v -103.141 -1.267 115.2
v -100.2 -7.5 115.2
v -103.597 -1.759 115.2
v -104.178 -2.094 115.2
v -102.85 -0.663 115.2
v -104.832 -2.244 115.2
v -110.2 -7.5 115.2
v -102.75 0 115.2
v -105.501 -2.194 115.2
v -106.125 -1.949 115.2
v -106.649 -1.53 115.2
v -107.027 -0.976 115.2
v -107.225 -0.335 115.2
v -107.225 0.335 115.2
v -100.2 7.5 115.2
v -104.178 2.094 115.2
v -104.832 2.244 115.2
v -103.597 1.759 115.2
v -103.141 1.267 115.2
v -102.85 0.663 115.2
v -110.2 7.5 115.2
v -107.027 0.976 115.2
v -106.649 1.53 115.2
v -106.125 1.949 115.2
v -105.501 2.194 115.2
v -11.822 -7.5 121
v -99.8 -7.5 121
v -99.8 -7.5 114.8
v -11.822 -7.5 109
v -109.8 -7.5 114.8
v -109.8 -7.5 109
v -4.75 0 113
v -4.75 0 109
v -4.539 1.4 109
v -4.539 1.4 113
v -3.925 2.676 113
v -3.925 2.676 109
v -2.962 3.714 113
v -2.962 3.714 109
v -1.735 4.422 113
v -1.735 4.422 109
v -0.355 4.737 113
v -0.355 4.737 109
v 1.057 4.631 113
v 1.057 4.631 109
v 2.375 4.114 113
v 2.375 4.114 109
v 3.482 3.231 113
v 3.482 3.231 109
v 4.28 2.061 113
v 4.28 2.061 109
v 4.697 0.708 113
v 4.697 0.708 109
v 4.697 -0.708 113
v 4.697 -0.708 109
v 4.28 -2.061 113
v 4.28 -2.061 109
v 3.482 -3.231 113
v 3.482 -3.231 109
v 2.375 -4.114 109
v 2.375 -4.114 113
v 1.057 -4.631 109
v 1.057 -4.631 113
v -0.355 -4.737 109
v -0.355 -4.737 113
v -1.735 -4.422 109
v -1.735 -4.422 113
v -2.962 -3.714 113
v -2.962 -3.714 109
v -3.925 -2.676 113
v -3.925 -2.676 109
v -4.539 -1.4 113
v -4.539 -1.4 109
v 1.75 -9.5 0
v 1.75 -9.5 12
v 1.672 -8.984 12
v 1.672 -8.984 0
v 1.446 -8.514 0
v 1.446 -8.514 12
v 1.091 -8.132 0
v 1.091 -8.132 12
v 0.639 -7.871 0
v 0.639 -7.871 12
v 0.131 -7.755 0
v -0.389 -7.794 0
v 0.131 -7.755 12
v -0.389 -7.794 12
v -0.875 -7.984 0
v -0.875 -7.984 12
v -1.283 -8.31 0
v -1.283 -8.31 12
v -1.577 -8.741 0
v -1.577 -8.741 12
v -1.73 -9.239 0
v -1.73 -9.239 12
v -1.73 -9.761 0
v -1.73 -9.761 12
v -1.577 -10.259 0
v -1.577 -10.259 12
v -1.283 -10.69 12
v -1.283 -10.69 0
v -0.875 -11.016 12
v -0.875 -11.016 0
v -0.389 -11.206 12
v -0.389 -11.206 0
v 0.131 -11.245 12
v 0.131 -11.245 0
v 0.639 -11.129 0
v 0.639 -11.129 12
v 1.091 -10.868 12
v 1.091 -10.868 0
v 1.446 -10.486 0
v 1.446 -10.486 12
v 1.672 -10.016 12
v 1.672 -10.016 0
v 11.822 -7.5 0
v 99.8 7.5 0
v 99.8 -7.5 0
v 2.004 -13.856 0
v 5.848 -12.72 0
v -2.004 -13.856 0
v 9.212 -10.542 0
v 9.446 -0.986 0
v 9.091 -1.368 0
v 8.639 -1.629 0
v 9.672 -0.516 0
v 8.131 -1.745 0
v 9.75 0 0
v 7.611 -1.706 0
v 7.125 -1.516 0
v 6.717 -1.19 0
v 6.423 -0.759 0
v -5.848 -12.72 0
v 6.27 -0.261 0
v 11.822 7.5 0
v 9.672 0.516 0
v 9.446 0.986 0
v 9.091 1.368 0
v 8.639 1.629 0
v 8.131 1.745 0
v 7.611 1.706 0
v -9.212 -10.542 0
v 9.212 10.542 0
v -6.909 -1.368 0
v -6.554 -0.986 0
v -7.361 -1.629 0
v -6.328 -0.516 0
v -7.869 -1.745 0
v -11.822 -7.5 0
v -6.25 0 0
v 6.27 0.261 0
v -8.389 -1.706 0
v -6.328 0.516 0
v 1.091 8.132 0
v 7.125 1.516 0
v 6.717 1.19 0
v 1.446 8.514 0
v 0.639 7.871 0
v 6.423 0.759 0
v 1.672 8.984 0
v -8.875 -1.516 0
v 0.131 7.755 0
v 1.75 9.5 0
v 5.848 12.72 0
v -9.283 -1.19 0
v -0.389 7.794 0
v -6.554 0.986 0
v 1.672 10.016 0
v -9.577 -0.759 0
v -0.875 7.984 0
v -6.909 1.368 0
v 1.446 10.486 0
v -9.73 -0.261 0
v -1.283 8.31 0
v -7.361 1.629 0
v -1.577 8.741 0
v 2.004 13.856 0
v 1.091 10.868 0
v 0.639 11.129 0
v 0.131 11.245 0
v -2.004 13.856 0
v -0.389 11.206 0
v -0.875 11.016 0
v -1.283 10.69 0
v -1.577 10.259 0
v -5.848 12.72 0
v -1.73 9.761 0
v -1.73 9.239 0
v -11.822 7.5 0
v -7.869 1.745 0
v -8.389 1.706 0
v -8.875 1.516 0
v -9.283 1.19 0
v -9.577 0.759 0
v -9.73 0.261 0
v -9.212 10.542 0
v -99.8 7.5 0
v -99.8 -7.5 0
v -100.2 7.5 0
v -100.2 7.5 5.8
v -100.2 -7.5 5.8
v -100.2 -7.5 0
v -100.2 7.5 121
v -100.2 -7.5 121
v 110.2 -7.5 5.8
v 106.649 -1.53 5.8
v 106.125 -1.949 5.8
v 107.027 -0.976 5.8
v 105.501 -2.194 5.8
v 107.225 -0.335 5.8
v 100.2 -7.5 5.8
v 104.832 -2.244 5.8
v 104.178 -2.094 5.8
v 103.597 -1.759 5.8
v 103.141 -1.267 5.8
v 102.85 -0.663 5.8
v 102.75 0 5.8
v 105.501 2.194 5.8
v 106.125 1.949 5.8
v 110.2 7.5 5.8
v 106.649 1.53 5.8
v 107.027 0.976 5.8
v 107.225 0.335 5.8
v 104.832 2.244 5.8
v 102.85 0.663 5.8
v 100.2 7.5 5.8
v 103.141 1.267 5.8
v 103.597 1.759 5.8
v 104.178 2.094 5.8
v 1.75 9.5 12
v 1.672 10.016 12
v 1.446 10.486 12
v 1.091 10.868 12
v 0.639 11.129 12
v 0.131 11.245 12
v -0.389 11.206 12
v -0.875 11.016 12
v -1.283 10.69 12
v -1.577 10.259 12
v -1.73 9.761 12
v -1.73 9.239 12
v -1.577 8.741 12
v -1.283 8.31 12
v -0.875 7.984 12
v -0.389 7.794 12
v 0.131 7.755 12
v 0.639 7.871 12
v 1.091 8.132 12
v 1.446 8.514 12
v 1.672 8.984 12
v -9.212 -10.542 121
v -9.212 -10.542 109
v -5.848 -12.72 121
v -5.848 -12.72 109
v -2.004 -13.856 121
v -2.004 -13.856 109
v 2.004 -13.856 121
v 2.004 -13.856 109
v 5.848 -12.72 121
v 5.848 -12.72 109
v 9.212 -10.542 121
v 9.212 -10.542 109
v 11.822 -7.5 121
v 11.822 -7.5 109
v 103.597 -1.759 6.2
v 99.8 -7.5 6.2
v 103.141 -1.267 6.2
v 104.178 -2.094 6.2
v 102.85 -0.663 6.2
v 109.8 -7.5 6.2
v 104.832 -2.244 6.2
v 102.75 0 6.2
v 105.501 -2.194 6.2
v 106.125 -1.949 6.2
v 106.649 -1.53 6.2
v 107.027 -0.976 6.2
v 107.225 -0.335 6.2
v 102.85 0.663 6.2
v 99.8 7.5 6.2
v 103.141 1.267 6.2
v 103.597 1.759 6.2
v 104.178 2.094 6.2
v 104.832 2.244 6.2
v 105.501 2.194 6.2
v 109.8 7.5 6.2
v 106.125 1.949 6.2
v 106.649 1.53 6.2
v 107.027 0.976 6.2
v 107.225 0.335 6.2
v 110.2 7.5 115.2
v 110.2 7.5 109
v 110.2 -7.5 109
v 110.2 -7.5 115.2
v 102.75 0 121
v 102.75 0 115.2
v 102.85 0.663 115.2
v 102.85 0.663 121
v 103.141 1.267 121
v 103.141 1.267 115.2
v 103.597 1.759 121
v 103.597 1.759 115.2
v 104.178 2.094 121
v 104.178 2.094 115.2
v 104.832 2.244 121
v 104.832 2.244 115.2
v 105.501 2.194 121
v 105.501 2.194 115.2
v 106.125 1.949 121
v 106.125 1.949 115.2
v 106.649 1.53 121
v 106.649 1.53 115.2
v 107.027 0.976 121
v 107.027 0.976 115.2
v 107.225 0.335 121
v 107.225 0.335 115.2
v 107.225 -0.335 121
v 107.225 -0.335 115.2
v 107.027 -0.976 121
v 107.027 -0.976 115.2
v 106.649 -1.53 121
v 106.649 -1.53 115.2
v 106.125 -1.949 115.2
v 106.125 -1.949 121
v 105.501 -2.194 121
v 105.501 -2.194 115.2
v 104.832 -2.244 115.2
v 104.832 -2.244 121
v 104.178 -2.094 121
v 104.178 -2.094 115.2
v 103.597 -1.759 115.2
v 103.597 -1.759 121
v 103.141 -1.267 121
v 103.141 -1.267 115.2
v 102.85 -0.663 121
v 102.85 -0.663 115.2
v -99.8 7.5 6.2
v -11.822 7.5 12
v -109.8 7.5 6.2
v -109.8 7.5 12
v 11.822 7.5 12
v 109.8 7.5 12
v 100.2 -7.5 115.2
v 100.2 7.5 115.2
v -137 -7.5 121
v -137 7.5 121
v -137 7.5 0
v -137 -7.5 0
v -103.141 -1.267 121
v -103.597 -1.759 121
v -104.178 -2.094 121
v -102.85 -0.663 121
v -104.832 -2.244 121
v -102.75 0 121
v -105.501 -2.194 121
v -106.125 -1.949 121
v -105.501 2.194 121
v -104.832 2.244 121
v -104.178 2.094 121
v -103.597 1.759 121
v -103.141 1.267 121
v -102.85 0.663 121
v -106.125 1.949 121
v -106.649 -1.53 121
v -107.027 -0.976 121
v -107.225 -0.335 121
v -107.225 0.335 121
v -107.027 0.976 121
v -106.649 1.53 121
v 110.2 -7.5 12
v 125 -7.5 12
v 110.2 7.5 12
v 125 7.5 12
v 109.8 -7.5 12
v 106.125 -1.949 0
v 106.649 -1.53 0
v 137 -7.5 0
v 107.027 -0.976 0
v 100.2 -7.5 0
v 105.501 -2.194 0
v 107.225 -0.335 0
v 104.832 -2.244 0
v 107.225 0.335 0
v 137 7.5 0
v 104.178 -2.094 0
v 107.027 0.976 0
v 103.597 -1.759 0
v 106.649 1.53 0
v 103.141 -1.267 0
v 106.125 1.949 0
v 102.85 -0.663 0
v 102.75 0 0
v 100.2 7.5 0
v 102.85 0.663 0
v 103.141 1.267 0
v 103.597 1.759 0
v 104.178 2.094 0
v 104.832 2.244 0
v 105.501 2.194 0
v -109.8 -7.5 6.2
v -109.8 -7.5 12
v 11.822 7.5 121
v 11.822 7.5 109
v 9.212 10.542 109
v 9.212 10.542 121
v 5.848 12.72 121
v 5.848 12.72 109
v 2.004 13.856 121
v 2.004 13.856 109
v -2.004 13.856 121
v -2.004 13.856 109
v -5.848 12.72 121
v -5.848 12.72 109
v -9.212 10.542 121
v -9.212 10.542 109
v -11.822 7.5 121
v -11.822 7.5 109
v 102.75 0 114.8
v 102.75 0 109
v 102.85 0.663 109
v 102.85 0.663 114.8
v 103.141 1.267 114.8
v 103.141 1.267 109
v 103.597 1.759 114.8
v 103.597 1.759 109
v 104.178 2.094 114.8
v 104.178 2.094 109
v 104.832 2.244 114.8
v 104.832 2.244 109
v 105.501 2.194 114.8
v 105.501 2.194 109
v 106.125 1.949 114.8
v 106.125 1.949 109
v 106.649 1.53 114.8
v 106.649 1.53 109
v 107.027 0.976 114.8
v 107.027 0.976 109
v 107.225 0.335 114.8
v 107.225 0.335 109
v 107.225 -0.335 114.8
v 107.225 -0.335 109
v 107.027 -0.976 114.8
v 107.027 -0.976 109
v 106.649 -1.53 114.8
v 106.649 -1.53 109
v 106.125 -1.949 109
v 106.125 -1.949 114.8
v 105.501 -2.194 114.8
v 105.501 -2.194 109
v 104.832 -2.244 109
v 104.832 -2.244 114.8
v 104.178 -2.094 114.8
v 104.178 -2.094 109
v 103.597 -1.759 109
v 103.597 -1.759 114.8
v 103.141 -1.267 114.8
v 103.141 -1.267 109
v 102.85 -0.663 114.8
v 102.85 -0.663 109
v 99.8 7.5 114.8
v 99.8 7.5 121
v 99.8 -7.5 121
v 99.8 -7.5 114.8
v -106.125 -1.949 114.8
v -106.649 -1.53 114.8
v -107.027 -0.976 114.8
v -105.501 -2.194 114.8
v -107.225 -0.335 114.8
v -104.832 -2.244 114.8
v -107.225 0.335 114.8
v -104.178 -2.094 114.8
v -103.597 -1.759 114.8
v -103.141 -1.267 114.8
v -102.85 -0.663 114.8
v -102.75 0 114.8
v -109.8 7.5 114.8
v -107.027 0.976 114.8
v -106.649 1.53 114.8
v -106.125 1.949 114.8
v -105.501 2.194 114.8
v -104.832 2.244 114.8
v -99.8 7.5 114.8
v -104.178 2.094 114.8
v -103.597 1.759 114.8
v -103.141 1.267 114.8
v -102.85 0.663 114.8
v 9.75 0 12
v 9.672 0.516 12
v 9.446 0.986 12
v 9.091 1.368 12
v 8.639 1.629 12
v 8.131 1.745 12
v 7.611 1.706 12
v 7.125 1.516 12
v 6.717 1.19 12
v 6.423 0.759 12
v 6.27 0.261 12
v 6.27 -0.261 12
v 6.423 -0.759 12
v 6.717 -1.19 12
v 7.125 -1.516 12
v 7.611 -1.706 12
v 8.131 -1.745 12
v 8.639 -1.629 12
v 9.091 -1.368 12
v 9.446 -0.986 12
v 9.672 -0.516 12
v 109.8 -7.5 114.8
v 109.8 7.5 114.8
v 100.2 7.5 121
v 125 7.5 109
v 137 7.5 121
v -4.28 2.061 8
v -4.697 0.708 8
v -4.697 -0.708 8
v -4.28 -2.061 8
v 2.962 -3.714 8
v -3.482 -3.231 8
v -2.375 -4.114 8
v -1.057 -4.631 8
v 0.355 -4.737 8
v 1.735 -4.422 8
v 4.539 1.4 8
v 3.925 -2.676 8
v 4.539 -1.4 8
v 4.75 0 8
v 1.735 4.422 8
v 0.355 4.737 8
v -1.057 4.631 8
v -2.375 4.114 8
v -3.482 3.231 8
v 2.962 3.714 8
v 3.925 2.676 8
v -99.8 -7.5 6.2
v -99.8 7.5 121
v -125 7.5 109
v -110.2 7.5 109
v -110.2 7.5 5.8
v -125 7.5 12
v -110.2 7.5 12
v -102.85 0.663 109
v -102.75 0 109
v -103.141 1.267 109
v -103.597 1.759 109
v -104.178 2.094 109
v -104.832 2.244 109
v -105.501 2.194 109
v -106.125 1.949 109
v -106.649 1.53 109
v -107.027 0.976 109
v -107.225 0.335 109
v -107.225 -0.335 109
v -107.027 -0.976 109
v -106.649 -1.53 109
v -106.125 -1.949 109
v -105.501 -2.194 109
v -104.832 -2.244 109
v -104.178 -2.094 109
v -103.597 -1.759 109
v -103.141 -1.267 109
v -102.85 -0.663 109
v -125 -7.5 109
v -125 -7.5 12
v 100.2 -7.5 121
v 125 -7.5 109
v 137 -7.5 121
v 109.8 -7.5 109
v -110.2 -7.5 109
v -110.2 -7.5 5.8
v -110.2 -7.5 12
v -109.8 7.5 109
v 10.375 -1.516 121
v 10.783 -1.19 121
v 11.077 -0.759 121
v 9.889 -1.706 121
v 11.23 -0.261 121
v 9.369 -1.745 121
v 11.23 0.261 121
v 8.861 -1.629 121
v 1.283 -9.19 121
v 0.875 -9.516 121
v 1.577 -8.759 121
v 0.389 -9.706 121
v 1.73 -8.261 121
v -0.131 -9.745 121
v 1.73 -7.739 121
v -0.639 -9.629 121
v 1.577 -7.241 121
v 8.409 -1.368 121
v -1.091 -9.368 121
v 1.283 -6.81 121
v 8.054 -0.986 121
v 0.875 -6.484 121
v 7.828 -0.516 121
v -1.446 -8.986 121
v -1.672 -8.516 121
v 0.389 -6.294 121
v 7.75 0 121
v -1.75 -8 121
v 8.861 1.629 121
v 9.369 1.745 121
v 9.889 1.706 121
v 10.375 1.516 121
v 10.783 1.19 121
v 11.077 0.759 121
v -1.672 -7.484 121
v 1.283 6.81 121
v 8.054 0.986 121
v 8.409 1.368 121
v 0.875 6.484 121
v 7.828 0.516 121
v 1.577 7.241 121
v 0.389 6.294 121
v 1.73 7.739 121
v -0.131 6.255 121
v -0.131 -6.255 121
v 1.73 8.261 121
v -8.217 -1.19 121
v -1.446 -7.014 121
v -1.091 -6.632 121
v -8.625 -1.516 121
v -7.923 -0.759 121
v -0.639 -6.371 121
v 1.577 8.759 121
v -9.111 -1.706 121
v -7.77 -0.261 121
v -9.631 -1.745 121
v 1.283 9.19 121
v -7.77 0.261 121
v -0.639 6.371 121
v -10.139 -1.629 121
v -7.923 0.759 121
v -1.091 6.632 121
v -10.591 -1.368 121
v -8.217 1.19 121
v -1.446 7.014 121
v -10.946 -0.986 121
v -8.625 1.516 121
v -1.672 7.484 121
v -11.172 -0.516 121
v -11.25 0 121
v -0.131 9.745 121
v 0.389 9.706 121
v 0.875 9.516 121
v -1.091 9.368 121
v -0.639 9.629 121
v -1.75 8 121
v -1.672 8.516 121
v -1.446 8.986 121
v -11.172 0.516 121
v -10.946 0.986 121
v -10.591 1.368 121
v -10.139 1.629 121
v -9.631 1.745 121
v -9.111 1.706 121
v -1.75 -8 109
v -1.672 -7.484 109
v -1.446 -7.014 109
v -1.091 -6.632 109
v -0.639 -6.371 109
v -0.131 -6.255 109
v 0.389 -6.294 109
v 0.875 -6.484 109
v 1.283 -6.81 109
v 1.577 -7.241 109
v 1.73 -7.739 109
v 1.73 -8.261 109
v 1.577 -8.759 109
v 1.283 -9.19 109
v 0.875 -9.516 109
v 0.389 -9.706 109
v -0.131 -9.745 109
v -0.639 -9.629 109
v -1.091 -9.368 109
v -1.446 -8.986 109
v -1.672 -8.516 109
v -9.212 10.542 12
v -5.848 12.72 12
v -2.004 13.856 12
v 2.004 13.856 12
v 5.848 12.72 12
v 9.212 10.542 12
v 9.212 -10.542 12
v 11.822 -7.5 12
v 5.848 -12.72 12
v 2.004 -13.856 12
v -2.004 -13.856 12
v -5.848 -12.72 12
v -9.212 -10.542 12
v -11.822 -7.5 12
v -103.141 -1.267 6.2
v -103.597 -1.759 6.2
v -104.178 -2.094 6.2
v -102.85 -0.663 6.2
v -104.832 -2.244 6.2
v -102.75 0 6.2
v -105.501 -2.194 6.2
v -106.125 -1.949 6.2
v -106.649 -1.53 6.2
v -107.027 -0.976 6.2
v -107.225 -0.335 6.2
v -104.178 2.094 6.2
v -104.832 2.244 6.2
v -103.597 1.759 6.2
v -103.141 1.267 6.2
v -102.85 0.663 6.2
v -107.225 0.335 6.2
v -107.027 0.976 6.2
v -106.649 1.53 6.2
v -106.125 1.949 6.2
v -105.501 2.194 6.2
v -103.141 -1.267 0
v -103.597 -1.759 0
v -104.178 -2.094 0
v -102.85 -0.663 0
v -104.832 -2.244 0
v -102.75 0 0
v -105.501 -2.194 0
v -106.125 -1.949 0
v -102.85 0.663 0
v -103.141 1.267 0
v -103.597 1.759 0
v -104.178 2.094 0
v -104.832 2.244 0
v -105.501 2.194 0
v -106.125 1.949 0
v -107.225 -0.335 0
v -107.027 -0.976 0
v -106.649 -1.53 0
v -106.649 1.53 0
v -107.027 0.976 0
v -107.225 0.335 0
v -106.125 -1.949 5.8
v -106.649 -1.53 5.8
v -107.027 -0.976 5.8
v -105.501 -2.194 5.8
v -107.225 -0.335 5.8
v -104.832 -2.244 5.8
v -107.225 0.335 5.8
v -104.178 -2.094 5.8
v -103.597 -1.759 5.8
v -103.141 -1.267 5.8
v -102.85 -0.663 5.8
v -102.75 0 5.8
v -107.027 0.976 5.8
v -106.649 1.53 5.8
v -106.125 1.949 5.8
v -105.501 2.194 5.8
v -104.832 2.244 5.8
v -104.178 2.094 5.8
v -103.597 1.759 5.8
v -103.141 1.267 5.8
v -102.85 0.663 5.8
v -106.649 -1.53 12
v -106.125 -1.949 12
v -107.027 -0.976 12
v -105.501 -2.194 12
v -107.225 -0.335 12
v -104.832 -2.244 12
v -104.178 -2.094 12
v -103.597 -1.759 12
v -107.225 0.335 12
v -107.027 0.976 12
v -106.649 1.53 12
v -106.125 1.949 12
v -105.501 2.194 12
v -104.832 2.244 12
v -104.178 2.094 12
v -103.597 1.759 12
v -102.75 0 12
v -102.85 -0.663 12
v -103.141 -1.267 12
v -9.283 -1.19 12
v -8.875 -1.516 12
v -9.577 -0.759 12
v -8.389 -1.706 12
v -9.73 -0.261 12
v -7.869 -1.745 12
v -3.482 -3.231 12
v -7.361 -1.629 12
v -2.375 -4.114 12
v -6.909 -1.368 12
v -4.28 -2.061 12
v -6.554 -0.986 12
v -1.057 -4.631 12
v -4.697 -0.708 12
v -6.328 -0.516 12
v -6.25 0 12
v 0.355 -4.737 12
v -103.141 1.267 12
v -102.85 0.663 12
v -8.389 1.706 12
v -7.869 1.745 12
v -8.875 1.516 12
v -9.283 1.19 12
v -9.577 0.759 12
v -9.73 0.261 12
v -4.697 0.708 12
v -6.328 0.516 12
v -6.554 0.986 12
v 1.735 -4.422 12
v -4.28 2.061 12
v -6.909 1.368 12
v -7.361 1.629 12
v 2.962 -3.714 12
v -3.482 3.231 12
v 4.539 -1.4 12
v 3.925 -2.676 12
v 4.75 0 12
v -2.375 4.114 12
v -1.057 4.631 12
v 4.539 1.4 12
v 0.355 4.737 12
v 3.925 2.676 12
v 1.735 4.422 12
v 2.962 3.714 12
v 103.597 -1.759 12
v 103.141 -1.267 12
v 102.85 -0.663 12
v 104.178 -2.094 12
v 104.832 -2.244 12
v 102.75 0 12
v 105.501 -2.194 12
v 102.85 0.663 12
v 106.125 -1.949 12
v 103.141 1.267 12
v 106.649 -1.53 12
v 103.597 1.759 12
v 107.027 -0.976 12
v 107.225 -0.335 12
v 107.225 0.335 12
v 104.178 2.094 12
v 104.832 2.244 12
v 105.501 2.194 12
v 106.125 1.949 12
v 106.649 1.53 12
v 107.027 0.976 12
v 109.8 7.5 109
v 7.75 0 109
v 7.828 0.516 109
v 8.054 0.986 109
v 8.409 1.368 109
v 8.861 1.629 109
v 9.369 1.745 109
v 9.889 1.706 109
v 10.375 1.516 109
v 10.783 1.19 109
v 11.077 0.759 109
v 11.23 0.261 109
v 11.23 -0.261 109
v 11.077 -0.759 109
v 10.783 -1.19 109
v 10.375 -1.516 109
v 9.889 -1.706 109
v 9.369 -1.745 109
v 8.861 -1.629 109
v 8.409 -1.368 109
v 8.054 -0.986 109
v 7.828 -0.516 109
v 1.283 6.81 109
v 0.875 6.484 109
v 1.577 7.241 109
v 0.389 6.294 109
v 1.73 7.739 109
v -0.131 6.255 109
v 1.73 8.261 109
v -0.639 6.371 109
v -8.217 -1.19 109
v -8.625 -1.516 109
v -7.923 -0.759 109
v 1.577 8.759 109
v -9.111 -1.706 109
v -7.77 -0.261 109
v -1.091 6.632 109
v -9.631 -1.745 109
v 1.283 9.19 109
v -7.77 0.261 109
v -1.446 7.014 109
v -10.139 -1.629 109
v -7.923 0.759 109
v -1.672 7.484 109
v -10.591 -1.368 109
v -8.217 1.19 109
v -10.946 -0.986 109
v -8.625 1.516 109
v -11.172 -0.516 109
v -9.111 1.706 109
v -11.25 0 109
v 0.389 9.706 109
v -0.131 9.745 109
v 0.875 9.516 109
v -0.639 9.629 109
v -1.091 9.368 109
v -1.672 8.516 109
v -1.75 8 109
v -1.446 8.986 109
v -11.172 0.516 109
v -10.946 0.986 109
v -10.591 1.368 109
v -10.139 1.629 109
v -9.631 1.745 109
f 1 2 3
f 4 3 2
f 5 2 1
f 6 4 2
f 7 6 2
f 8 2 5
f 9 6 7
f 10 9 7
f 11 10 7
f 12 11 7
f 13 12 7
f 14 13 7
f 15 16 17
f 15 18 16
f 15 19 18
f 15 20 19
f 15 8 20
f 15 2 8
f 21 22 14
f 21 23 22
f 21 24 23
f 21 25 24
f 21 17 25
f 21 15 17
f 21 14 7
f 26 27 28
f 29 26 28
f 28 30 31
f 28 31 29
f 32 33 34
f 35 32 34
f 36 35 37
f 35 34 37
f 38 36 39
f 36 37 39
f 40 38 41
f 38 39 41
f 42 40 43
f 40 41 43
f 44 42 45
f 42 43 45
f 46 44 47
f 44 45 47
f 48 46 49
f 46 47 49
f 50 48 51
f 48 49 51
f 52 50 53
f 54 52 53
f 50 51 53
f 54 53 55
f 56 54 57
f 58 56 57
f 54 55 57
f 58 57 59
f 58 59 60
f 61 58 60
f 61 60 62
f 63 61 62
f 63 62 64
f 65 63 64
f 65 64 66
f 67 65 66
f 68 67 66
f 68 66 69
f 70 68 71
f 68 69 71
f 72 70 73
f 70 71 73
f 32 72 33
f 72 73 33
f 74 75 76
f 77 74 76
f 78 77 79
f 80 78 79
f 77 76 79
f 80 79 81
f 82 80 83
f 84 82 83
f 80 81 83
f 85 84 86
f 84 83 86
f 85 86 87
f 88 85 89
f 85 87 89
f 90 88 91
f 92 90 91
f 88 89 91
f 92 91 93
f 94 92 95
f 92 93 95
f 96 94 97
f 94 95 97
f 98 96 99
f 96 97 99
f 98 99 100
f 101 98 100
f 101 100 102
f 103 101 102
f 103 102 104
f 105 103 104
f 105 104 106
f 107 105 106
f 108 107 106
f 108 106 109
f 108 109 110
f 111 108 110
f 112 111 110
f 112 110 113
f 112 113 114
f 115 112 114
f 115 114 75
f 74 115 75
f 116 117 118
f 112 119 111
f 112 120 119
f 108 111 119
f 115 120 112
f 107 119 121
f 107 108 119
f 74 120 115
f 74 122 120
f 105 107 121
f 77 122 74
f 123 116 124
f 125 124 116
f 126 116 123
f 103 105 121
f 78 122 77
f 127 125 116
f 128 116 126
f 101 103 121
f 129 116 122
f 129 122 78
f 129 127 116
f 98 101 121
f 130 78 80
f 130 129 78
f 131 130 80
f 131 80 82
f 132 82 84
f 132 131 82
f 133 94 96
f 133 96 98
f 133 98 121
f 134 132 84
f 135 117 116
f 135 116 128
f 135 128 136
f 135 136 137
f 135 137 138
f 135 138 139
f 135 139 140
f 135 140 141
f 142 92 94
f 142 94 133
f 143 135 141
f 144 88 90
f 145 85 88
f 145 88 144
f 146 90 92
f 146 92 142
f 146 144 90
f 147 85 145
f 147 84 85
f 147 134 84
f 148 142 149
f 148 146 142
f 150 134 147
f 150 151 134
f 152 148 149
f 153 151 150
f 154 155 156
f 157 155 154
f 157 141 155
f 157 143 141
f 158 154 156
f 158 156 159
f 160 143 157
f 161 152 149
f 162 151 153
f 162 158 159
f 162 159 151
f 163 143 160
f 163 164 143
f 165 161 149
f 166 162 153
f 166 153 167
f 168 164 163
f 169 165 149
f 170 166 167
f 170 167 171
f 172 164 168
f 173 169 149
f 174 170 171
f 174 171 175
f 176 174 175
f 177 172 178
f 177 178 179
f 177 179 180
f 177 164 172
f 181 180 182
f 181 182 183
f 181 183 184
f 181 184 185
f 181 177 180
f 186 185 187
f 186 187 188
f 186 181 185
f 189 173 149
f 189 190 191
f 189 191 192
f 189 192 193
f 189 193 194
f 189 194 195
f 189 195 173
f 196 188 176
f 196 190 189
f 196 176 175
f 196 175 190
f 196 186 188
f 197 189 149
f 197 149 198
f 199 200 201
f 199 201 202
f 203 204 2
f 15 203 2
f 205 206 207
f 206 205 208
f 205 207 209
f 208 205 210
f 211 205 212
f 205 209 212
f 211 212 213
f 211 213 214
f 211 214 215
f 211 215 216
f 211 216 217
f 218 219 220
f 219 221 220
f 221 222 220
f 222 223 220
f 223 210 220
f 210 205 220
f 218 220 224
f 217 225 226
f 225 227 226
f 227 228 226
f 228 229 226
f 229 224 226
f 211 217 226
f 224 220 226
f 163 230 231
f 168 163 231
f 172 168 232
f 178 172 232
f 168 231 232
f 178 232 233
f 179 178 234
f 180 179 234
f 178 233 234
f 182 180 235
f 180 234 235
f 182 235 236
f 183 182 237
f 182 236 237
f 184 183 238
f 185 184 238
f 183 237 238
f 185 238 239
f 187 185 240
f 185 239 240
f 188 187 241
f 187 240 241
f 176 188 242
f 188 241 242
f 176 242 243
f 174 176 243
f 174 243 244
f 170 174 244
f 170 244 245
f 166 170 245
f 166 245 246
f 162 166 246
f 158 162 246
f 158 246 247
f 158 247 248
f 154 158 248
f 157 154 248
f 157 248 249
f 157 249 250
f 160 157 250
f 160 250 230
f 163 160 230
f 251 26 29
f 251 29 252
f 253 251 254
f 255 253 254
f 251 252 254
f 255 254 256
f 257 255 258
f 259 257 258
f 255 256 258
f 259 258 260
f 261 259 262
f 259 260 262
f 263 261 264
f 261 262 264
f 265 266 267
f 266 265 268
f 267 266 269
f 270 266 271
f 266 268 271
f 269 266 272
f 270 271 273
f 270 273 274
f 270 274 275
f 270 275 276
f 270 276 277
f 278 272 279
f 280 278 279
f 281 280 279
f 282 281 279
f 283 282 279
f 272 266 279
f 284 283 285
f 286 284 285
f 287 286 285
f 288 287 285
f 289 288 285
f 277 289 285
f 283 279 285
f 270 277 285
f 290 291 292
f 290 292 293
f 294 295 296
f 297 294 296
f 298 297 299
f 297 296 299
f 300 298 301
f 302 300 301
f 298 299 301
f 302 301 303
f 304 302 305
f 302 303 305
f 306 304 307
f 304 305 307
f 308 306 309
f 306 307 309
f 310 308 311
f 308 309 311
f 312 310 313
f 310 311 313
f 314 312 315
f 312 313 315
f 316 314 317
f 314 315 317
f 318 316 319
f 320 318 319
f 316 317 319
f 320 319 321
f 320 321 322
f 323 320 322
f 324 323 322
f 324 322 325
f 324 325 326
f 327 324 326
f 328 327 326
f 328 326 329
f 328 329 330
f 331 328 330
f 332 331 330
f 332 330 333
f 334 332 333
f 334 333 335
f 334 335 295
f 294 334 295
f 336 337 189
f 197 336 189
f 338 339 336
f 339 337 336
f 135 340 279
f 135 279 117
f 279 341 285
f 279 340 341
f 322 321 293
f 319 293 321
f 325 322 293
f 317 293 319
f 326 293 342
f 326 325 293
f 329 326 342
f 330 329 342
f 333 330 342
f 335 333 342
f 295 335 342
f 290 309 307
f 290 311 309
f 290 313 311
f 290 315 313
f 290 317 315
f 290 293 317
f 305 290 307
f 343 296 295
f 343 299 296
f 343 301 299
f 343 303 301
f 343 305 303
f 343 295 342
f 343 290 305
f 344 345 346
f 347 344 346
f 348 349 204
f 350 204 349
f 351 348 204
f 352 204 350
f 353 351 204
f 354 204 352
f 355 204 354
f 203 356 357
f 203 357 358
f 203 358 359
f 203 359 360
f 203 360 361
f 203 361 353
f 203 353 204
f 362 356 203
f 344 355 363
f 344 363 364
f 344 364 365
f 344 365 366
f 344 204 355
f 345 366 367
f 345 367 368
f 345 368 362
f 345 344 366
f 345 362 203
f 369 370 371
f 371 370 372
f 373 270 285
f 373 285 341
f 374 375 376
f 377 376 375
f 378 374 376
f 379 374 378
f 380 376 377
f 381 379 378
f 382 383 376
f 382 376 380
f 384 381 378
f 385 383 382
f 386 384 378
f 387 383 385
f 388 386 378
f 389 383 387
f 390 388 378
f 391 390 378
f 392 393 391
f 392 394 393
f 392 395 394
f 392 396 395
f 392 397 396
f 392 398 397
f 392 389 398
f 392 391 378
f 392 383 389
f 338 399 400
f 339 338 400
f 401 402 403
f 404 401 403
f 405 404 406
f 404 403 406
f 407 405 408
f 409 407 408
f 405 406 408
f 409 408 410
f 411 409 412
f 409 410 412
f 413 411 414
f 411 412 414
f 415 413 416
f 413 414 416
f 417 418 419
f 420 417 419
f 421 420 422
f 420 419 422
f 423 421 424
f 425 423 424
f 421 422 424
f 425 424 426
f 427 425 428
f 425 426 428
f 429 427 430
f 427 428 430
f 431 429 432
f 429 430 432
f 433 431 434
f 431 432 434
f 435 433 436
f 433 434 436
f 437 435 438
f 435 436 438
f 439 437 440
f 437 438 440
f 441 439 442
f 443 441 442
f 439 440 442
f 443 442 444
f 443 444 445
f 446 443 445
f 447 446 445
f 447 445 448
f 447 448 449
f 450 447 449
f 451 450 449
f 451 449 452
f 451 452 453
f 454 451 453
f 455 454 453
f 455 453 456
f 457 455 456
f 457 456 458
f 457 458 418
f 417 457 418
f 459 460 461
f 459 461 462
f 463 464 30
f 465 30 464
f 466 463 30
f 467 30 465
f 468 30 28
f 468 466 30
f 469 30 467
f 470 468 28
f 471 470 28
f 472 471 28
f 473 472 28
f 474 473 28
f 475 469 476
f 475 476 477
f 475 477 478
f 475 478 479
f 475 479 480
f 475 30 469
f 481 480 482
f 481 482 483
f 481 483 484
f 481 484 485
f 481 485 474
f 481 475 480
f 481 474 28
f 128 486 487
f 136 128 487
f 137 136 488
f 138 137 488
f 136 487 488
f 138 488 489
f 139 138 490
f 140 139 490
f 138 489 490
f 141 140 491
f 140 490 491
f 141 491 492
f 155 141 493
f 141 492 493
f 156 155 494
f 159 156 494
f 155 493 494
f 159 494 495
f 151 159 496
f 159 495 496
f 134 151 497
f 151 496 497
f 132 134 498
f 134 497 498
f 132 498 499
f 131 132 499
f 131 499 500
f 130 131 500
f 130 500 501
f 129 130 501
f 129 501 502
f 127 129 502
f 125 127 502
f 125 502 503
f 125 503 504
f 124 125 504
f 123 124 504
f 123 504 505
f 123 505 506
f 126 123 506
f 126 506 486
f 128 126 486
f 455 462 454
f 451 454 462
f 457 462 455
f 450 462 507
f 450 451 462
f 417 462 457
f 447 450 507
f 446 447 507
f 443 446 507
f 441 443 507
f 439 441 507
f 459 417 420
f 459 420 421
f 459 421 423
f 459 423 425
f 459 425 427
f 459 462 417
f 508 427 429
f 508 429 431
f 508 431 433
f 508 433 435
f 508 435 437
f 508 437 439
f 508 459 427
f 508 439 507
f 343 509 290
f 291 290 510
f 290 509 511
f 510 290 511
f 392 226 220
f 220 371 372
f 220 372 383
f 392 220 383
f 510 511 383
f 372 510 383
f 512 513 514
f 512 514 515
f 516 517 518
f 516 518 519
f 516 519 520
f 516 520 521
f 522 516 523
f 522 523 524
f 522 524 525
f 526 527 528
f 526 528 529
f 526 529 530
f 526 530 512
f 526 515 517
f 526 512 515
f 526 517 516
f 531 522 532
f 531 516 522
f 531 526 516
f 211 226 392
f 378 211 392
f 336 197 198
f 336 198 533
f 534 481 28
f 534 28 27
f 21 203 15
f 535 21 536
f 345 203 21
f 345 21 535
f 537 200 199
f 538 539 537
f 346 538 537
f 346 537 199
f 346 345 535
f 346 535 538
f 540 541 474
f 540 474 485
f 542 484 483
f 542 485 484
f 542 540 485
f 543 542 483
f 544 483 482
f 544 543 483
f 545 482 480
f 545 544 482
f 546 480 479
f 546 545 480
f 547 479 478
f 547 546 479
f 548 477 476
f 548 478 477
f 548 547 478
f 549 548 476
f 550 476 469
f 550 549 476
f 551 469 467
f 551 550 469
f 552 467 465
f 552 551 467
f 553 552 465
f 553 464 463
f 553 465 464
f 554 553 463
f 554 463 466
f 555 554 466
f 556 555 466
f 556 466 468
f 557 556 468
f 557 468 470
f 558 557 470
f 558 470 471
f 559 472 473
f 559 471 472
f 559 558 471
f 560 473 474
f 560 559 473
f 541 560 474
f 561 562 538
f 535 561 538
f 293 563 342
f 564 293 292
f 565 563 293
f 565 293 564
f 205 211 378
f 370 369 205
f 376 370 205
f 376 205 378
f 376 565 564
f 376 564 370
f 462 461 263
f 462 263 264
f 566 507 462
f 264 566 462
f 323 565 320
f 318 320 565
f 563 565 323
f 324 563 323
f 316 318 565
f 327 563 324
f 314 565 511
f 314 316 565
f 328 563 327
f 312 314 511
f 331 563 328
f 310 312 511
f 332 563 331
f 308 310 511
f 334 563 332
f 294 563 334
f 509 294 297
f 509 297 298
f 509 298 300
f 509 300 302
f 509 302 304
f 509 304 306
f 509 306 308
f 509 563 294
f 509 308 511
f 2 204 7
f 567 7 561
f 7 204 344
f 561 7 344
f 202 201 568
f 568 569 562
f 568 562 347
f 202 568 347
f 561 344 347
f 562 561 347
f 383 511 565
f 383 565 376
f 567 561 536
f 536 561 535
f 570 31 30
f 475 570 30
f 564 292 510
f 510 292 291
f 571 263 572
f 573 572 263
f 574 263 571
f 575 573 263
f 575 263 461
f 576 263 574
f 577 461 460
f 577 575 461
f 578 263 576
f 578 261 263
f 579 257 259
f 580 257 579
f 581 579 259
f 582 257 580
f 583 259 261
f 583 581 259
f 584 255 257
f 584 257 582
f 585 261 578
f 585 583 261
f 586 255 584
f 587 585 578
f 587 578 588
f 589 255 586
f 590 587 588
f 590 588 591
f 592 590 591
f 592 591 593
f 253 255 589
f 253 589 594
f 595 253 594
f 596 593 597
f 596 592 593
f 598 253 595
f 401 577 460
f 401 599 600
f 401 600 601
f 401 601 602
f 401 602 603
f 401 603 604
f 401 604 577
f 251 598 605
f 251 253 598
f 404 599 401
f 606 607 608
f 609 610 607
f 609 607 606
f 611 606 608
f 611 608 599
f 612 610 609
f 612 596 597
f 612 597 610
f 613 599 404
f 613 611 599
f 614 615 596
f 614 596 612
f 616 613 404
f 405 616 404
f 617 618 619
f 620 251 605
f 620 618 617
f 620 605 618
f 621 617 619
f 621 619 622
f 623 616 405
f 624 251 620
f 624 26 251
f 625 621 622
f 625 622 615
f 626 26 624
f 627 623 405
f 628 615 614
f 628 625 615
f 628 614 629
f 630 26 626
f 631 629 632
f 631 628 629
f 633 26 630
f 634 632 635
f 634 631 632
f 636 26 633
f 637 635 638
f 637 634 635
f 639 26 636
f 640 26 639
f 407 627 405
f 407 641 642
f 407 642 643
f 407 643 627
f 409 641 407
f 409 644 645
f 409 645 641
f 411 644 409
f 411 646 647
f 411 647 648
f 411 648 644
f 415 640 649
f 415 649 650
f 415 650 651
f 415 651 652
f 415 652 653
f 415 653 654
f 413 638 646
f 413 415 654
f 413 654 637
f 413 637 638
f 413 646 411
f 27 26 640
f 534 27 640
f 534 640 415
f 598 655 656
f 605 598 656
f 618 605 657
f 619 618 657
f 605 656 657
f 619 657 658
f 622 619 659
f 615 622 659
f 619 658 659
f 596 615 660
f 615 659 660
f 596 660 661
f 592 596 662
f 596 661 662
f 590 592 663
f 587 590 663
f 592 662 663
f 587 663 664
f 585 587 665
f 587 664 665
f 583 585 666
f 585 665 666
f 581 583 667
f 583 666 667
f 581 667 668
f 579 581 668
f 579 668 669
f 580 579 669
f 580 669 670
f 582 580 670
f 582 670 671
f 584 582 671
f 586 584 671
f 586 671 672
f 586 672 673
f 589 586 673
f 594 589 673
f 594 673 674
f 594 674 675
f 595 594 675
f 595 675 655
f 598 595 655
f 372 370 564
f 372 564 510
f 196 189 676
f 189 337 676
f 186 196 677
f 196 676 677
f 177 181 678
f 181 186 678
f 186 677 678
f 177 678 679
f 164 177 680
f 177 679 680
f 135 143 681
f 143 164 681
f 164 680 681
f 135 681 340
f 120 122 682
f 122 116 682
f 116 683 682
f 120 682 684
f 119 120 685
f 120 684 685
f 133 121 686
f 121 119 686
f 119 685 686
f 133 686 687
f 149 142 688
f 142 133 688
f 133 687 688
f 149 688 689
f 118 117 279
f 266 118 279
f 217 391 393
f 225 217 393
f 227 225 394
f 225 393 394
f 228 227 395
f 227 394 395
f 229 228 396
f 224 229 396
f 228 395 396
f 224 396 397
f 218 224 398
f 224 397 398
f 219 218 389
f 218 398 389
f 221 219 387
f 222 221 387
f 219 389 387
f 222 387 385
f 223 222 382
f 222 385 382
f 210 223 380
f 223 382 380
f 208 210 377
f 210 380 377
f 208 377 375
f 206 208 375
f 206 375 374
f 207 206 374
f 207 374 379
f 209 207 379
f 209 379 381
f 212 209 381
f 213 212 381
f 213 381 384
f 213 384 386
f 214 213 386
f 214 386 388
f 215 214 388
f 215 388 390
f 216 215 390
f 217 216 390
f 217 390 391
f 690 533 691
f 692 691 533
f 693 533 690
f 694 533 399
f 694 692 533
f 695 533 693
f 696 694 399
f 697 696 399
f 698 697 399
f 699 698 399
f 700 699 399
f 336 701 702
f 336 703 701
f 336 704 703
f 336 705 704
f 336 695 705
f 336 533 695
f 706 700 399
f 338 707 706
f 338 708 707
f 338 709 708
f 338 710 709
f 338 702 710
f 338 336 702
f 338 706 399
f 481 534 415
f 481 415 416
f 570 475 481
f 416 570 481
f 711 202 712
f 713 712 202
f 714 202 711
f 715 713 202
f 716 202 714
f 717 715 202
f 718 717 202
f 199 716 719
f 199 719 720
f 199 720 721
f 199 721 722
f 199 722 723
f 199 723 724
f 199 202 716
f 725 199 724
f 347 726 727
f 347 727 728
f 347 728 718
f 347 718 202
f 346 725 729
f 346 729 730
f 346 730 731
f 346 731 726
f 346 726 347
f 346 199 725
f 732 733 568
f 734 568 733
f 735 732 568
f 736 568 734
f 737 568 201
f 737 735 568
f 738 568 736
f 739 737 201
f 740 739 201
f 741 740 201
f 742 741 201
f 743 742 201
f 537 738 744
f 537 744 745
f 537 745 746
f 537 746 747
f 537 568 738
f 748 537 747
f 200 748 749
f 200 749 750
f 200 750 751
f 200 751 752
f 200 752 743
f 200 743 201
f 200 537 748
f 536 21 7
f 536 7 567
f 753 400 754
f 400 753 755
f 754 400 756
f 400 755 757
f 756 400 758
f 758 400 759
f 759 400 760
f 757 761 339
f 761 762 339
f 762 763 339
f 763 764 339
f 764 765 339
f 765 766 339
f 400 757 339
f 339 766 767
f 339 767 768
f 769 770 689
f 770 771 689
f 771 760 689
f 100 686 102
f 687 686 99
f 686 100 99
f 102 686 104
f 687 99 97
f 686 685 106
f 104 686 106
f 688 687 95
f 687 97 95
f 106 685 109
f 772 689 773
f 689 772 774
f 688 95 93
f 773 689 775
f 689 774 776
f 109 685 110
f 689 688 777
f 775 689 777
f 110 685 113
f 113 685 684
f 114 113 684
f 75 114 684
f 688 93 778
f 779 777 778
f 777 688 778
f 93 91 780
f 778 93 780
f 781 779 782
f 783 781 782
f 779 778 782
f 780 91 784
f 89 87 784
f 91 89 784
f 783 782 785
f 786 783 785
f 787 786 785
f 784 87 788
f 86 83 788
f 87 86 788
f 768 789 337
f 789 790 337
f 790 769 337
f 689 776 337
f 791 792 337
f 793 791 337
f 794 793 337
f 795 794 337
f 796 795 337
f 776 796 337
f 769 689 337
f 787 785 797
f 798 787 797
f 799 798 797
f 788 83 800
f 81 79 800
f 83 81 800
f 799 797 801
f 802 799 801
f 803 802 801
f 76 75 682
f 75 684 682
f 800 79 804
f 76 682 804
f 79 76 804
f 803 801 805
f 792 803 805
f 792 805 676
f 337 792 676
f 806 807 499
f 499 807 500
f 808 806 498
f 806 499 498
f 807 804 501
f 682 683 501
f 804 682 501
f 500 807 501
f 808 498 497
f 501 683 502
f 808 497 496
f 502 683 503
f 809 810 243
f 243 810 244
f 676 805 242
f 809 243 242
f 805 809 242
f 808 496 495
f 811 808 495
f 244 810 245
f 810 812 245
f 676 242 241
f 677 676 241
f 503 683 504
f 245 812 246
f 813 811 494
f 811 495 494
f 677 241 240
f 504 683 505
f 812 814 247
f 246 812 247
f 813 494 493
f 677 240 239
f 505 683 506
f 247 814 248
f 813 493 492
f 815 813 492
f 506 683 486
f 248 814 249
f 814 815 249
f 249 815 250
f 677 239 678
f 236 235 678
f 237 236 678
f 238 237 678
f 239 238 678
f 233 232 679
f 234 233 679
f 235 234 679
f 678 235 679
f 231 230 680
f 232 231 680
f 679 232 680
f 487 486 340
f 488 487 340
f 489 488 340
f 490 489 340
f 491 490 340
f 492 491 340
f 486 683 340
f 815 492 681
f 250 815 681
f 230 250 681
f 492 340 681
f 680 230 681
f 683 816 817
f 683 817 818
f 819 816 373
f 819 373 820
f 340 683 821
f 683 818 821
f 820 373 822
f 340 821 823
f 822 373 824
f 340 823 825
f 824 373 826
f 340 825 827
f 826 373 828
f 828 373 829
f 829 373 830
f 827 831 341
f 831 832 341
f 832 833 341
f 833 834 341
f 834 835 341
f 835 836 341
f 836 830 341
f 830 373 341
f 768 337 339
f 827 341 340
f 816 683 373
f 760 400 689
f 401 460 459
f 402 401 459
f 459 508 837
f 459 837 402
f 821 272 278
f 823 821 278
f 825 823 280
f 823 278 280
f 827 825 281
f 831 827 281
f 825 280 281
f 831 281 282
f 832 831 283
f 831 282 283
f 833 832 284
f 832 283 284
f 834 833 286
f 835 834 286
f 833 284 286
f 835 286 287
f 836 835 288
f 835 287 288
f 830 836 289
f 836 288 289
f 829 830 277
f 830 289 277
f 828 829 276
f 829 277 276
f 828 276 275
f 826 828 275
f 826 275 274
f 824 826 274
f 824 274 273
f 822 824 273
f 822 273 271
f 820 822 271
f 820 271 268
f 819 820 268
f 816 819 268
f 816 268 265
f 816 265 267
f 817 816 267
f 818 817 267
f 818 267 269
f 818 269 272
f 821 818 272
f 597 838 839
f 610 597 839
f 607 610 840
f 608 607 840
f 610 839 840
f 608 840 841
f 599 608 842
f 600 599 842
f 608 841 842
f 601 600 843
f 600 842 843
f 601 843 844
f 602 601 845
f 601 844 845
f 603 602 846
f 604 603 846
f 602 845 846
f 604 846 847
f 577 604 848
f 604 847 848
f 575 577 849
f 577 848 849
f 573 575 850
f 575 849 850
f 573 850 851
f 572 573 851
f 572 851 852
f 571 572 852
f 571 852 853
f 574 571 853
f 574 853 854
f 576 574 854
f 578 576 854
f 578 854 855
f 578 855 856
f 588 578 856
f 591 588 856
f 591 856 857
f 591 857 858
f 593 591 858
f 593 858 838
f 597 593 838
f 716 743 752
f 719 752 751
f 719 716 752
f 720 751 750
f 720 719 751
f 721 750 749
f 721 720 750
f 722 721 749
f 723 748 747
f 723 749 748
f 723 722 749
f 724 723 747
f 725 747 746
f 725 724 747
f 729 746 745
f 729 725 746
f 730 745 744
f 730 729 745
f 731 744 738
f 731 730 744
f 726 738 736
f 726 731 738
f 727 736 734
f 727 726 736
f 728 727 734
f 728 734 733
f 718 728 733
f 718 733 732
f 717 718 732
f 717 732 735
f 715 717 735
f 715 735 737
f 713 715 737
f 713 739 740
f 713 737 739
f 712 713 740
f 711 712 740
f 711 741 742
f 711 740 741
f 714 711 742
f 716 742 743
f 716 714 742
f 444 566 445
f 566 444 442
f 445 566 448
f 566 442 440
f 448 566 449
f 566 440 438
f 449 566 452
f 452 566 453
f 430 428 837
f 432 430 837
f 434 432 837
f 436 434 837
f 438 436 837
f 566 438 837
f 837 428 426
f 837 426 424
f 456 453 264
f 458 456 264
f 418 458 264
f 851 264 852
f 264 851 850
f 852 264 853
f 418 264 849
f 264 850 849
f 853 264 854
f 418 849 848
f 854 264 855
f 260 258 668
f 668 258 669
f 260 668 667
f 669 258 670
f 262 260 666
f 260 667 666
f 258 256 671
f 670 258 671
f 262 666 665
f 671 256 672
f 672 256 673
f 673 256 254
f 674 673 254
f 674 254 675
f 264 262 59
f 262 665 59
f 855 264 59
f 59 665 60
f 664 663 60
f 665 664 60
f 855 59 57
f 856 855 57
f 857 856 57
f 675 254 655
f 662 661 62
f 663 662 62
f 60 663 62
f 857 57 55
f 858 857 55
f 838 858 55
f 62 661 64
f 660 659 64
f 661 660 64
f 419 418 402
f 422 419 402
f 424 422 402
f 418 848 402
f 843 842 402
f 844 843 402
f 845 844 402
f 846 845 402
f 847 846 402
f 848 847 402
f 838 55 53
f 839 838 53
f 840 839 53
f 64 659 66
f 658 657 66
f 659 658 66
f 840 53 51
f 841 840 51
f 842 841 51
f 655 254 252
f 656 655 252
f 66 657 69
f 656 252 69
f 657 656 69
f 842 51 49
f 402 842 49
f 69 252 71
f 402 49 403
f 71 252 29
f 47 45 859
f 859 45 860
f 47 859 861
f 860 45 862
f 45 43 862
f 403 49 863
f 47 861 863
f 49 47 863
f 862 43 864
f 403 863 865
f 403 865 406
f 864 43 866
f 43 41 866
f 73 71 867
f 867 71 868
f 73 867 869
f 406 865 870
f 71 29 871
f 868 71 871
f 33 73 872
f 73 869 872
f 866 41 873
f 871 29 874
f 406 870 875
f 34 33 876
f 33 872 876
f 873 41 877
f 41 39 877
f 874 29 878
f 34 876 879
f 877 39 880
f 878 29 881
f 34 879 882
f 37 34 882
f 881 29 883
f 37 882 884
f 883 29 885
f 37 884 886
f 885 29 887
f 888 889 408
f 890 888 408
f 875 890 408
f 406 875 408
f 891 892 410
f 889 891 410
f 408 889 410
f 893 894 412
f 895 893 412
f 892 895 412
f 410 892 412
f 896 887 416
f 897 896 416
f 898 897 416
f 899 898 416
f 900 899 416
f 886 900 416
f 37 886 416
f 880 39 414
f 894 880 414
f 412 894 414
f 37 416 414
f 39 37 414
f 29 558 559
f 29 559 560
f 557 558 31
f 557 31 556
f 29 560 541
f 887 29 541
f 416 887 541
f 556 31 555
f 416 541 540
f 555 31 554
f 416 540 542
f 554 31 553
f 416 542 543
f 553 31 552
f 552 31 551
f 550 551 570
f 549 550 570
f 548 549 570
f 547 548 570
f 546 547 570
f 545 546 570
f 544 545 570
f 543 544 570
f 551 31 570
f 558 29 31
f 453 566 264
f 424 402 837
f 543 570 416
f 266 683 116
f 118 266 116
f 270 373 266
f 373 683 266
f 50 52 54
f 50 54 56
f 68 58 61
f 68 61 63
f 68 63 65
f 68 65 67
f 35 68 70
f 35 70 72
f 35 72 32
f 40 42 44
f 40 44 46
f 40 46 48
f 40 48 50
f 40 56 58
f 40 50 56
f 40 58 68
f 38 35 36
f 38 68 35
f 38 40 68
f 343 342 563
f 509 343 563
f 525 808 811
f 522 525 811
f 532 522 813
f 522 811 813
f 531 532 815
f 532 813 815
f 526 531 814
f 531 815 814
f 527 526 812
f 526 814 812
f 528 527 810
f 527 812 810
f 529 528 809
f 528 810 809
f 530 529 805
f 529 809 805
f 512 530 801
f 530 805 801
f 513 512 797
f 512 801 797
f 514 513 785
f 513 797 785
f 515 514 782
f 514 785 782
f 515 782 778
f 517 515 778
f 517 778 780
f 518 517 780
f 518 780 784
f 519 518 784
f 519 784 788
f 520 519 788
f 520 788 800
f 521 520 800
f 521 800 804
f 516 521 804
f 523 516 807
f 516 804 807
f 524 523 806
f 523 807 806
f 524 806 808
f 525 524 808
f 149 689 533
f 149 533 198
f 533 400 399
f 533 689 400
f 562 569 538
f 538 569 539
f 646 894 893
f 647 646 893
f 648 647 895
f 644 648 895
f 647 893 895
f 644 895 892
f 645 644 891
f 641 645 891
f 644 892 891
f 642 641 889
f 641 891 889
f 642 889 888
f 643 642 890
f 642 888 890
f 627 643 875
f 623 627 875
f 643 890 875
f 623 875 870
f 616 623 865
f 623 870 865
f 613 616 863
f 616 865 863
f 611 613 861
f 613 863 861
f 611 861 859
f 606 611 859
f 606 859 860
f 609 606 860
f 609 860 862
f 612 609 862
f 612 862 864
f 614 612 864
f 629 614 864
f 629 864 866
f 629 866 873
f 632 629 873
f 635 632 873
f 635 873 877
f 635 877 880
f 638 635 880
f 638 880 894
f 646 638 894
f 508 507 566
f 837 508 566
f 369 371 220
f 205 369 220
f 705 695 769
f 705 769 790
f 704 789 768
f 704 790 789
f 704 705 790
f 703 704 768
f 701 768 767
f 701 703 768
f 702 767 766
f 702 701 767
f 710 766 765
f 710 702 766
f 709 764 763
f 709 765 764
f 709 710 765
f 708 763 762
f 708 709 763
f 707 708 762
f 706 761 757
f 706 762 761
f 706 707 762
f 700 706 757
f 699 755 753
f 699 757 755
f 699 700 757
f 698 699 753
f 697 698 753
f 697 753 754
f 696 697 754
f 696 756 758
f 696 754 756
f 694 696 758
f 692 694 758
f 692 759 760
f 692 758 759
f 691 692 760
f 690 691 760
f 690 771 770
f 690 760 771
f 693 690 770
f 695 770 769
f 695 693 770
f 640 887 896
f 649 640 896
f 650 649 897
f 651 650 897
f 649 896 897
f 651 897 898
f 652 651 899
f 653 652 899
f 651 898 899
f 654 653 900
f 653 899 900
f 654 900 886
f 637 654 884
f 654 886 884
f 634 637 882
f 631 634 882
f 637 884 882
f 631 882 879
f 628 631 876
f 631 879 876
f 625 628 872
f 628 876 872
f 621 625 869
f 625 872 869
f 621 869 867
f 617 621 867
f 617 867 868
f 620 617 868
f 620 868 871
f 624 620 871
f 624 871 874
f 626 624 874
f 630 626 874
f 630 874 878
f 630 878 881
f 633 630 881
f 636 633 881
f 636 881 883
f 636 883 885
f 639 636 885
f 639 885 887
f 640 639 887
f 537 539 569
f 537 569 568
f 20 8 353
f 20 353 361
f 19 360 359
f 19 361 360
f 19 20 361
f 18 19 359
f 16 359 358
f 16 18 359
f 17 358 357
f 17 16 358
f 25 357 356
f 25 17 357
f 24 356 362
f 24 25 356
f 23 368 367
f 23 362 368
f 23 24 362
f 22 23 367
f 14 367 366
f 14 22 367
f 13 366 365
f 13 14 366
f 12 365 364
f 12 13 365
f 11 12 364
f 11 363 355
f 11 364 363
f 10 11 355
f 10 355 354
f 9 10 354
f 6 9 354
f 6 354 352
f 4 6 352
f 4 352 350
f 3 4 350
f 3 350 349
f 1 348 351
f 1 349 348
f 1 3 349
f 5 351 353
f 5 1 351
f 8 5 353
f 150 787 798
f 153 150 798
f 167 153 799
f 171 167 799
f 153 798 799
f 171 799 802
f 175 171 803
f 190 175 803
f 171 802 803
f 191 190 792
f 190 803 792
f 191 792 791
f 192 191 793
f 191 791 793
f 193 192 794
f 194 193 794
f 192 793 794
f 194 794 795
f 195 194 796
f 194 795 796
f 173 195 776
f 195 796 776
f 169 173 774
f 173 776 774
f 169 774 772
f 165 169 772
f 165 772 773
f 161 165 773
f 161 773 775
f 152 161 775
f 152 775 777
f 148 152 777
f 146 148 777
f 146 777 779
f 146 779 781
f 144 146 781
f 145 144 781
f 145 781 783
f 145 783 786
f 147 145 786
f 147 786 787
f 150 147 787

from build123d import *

# Parameters (mm, degrees)
SKETCH2_R           = 14
BOSS_EXTRUDE1_DEPTH = 12
SKETCH10_W          = 12
SKETCH10_H          = 15
BOSS_EXTRUDE5_DEPTH = 137
SKETCH11_W          = 12
SKETCH11_H          = 15
BOSS_EXTRUDE6_DEPTH = 97
SKETCH12_W          = 12
SKETCH12_H          = 15
BOSS_EXTRUDE7_DEPTH = 137
SKETCH13_R          = 14
BOSS_EXTRUDE8_DEPTH = 12
SKETCH4_R           = 4.75
CUT_EXTRUDE2_DEPTH  = 4
SKETCH3_R           = 1.75
CUT_EXTRUDE1_DEPTH  = 13
SKETCH14_R          = 4.75
CUT_EXTRUDE3_DEPTH  = 4
SKETCH15_R          = 1.75
CUT_EXTRUDE4_DEPTH  = 13
CUT_EXTRUDE5_DEPTH  = 22.5
SKETCH17_R          = 2.25
CUT_EXTRUDE6_DEPTH  = 122


with BuildPart() as part:
    # Sketch2 → Boss-Extrude1 (new body)
    with BuildSketch(Plane(origin=(0, 0, 12), x_dir=(-1, 0, 0), z_dir=(0, 0, -1))):
        Circle(SKETCH2_R)
    extrude(amount=BOSS_EXTRUDE1_DEPTH)

    # Sketch10 → Boss-Extrude5 (add)
    with BuildSketch(Plane(origin=(0, 0, 0), x_dir=(0, 0, -1), z_dir=(1, 0, 0))):
        with Locations((-6, 0)):
            Rectangle(SKETCH10_W, SKETCH10_H)
    boss_extrude5 = extrude(amount=BOSS_EXTRUDE5_DEPTH)

    # Sketch11 → Boss-Extrude6 (add)
    with BuildSketch(Plane.XY.offset(12)):
        with Locations((131, 0)):
            Rectangle(SKETCH11_W, SKETCH11_H)
    boss_extrude6 = extrude(amount=BOSS_EXTRUDE6_DEPTH)

    # Sketch12 → Boss-Extrude7 (add)
    with BuildSketch(Plane(origin=(137, 0, 0), x_dir=(0, 0, -1), z_dir=(1, 0, 0))):
        with Locations((-115, 0)):
            Rectangle(SKETCH12_W, SKETCH12_H)
    boss_extrude7 = extrude(amount=-BOSS_EXTRUDE7_DEPTH)

    # Sketch13 → Boss-Extrude8 (add)
    with BuildSketch(Plane.XY.offset(109)):
        Circle(SKETCH13_R)
    extrude(amount=BOSS_EXTRUDE8_DEPTH)

    # Mirror6: Boss-Extrude5, Boss-Extrude6, Boss-Extrude7 across plane
    add(boss_extrude5.mirror(Plane(origin=(0, 0, 0), x_dir=(0, 0, 1), z_dir=(1, 0, 0))))
    add(boss_extrude6.mirror(Plane(origin=(0, 0, 0), x_dir=(0, 0, 1), z_dir=(1, 0, 0))))
    add(boss_extrude7.mirror(Plane(origin=(0, 0, 0), x_dir=(0, 0, 1), z_dir=(1, 0, 0))))

    # Sketch4 → Cut-Extrude2 (cut)
    with BuildSketch(Plane.XY.offset(12)):
        Circle(SKETCH4_R)
    extrude(amount=-CUT_EXTRUDE2_DEPTH, mode=Mode.SUBTRACT)

    # Sketch3 → Cut-Extrude1 (cut, through all)
    with BuildSketch(Plane.XY.offset(12)):
        with Locations((8, 0)):
            Circle(SKETCH3_R)
        with Locations((0, -9.5)):
            Circle(SKETCH3_R)
        with Locations((-8, 0)):
            Circle(SKETCH3_R)
        with Locations((0, 9.5)):
            Circle(SKETCH3_R)
    extrude(amount=-CUT_EXTRUDE1_DEPTH, mode=Mode.SUBTRACT)

    # Sketch14 → Cut-Extrude3 (cut)
    with BuildSketch(Plane(origin=(0, 0, 109), x_dir=(-1, 0, 0), z_dir=(0, 0, -1))):
        Circle(SKETCH14_R)
    extrude(amount=-CUT_EXTRUDE3_DEPTH, mode=Mode.SUBTRACT)

    # Sketch15 → Cut-Extrude4 (cut, through all)
    with BuildSketch(Plane(origin=(0, 0, 109), x_dir=(-1, 0, 0), z_dir=(0, 0, -1))):
        with Locations((-9.5, 0)):
            Circle(SKETCH15_R)
        with Locations((0, 8)):
            Circle(SKETCH15_R)
        with Locations((9.5, 0)):
            Circle(SKETCH15_R)
        with Locations((0, -8)):
            Circle(SKETCH15_R)
    extrude(amount=-CUT_EXTRUDE4_DEPTH, mode=Mode.SUBTRACT)

    # Sketch16 → Cut-Extrude5 (cut, through all)
    with BuildSketch(Plane(origin=(0, 7.5, 0), x_dir=(1, 0, 0), z_dir=(0, 1, 0))):
        Polygon((99.8, 0), (99.8, -6.2), (109.8, -6.2), (109.8, -12), (110.2, -12), (110.2, -5.8), (100.2, -5.8), (100.2, 0), align=None)
        Polygon((109.8, -109), (110.2, -109), (110.2, -115.2), (100.2, -115.2), (100.2, -121), (99.8, -121), (99.8, -114.8), (109.8, -114.8), align=None)
        Polygon((-99.8, -121), (-100.2, -121), (-100.2, -115.2), (-110.2, -115.2), (-110.2, -109), (-109.8, -109), (-109.8, -114.8), (-99.8, -114.8), align=None)
        Polygon((-109.8, -12), (-110.2, -12), (-110.2, -5.8), (-100.2, -5.8), (-100.2, 0), (-99.8, 0), (-99.8, -6.2), (-109.8, -6.2), align=None)
    extrude(amount=-CUT_EXTRUDE5_DEPTH, mode=Mode.SUBTRACT)

    # Sketch17 → Cut-Extrude6 (cut, through all)
    with BuildSketch(Plane(origin=(0, 0, 0), x_dir=(-1, 0, 0), z_dir=(0, 0, -1))):
        with Locations((-105, 0)):
            Circle(SKETCH17_R)
    cut_extrude6 = extrude(amount=-CUT_EXTRUDE6_DEPTH, mode=Mode.SUBTRACT)

    # Mirror7: Cut-Extrude6 across plane
    add(cut_extrude6.mirror(Plane(origin=(0, 0, 0), x_dir=(0, 0, 1), z_dir=(1, 0, 0))), mode=Mode.SUBTRACT)


solid = part.part
